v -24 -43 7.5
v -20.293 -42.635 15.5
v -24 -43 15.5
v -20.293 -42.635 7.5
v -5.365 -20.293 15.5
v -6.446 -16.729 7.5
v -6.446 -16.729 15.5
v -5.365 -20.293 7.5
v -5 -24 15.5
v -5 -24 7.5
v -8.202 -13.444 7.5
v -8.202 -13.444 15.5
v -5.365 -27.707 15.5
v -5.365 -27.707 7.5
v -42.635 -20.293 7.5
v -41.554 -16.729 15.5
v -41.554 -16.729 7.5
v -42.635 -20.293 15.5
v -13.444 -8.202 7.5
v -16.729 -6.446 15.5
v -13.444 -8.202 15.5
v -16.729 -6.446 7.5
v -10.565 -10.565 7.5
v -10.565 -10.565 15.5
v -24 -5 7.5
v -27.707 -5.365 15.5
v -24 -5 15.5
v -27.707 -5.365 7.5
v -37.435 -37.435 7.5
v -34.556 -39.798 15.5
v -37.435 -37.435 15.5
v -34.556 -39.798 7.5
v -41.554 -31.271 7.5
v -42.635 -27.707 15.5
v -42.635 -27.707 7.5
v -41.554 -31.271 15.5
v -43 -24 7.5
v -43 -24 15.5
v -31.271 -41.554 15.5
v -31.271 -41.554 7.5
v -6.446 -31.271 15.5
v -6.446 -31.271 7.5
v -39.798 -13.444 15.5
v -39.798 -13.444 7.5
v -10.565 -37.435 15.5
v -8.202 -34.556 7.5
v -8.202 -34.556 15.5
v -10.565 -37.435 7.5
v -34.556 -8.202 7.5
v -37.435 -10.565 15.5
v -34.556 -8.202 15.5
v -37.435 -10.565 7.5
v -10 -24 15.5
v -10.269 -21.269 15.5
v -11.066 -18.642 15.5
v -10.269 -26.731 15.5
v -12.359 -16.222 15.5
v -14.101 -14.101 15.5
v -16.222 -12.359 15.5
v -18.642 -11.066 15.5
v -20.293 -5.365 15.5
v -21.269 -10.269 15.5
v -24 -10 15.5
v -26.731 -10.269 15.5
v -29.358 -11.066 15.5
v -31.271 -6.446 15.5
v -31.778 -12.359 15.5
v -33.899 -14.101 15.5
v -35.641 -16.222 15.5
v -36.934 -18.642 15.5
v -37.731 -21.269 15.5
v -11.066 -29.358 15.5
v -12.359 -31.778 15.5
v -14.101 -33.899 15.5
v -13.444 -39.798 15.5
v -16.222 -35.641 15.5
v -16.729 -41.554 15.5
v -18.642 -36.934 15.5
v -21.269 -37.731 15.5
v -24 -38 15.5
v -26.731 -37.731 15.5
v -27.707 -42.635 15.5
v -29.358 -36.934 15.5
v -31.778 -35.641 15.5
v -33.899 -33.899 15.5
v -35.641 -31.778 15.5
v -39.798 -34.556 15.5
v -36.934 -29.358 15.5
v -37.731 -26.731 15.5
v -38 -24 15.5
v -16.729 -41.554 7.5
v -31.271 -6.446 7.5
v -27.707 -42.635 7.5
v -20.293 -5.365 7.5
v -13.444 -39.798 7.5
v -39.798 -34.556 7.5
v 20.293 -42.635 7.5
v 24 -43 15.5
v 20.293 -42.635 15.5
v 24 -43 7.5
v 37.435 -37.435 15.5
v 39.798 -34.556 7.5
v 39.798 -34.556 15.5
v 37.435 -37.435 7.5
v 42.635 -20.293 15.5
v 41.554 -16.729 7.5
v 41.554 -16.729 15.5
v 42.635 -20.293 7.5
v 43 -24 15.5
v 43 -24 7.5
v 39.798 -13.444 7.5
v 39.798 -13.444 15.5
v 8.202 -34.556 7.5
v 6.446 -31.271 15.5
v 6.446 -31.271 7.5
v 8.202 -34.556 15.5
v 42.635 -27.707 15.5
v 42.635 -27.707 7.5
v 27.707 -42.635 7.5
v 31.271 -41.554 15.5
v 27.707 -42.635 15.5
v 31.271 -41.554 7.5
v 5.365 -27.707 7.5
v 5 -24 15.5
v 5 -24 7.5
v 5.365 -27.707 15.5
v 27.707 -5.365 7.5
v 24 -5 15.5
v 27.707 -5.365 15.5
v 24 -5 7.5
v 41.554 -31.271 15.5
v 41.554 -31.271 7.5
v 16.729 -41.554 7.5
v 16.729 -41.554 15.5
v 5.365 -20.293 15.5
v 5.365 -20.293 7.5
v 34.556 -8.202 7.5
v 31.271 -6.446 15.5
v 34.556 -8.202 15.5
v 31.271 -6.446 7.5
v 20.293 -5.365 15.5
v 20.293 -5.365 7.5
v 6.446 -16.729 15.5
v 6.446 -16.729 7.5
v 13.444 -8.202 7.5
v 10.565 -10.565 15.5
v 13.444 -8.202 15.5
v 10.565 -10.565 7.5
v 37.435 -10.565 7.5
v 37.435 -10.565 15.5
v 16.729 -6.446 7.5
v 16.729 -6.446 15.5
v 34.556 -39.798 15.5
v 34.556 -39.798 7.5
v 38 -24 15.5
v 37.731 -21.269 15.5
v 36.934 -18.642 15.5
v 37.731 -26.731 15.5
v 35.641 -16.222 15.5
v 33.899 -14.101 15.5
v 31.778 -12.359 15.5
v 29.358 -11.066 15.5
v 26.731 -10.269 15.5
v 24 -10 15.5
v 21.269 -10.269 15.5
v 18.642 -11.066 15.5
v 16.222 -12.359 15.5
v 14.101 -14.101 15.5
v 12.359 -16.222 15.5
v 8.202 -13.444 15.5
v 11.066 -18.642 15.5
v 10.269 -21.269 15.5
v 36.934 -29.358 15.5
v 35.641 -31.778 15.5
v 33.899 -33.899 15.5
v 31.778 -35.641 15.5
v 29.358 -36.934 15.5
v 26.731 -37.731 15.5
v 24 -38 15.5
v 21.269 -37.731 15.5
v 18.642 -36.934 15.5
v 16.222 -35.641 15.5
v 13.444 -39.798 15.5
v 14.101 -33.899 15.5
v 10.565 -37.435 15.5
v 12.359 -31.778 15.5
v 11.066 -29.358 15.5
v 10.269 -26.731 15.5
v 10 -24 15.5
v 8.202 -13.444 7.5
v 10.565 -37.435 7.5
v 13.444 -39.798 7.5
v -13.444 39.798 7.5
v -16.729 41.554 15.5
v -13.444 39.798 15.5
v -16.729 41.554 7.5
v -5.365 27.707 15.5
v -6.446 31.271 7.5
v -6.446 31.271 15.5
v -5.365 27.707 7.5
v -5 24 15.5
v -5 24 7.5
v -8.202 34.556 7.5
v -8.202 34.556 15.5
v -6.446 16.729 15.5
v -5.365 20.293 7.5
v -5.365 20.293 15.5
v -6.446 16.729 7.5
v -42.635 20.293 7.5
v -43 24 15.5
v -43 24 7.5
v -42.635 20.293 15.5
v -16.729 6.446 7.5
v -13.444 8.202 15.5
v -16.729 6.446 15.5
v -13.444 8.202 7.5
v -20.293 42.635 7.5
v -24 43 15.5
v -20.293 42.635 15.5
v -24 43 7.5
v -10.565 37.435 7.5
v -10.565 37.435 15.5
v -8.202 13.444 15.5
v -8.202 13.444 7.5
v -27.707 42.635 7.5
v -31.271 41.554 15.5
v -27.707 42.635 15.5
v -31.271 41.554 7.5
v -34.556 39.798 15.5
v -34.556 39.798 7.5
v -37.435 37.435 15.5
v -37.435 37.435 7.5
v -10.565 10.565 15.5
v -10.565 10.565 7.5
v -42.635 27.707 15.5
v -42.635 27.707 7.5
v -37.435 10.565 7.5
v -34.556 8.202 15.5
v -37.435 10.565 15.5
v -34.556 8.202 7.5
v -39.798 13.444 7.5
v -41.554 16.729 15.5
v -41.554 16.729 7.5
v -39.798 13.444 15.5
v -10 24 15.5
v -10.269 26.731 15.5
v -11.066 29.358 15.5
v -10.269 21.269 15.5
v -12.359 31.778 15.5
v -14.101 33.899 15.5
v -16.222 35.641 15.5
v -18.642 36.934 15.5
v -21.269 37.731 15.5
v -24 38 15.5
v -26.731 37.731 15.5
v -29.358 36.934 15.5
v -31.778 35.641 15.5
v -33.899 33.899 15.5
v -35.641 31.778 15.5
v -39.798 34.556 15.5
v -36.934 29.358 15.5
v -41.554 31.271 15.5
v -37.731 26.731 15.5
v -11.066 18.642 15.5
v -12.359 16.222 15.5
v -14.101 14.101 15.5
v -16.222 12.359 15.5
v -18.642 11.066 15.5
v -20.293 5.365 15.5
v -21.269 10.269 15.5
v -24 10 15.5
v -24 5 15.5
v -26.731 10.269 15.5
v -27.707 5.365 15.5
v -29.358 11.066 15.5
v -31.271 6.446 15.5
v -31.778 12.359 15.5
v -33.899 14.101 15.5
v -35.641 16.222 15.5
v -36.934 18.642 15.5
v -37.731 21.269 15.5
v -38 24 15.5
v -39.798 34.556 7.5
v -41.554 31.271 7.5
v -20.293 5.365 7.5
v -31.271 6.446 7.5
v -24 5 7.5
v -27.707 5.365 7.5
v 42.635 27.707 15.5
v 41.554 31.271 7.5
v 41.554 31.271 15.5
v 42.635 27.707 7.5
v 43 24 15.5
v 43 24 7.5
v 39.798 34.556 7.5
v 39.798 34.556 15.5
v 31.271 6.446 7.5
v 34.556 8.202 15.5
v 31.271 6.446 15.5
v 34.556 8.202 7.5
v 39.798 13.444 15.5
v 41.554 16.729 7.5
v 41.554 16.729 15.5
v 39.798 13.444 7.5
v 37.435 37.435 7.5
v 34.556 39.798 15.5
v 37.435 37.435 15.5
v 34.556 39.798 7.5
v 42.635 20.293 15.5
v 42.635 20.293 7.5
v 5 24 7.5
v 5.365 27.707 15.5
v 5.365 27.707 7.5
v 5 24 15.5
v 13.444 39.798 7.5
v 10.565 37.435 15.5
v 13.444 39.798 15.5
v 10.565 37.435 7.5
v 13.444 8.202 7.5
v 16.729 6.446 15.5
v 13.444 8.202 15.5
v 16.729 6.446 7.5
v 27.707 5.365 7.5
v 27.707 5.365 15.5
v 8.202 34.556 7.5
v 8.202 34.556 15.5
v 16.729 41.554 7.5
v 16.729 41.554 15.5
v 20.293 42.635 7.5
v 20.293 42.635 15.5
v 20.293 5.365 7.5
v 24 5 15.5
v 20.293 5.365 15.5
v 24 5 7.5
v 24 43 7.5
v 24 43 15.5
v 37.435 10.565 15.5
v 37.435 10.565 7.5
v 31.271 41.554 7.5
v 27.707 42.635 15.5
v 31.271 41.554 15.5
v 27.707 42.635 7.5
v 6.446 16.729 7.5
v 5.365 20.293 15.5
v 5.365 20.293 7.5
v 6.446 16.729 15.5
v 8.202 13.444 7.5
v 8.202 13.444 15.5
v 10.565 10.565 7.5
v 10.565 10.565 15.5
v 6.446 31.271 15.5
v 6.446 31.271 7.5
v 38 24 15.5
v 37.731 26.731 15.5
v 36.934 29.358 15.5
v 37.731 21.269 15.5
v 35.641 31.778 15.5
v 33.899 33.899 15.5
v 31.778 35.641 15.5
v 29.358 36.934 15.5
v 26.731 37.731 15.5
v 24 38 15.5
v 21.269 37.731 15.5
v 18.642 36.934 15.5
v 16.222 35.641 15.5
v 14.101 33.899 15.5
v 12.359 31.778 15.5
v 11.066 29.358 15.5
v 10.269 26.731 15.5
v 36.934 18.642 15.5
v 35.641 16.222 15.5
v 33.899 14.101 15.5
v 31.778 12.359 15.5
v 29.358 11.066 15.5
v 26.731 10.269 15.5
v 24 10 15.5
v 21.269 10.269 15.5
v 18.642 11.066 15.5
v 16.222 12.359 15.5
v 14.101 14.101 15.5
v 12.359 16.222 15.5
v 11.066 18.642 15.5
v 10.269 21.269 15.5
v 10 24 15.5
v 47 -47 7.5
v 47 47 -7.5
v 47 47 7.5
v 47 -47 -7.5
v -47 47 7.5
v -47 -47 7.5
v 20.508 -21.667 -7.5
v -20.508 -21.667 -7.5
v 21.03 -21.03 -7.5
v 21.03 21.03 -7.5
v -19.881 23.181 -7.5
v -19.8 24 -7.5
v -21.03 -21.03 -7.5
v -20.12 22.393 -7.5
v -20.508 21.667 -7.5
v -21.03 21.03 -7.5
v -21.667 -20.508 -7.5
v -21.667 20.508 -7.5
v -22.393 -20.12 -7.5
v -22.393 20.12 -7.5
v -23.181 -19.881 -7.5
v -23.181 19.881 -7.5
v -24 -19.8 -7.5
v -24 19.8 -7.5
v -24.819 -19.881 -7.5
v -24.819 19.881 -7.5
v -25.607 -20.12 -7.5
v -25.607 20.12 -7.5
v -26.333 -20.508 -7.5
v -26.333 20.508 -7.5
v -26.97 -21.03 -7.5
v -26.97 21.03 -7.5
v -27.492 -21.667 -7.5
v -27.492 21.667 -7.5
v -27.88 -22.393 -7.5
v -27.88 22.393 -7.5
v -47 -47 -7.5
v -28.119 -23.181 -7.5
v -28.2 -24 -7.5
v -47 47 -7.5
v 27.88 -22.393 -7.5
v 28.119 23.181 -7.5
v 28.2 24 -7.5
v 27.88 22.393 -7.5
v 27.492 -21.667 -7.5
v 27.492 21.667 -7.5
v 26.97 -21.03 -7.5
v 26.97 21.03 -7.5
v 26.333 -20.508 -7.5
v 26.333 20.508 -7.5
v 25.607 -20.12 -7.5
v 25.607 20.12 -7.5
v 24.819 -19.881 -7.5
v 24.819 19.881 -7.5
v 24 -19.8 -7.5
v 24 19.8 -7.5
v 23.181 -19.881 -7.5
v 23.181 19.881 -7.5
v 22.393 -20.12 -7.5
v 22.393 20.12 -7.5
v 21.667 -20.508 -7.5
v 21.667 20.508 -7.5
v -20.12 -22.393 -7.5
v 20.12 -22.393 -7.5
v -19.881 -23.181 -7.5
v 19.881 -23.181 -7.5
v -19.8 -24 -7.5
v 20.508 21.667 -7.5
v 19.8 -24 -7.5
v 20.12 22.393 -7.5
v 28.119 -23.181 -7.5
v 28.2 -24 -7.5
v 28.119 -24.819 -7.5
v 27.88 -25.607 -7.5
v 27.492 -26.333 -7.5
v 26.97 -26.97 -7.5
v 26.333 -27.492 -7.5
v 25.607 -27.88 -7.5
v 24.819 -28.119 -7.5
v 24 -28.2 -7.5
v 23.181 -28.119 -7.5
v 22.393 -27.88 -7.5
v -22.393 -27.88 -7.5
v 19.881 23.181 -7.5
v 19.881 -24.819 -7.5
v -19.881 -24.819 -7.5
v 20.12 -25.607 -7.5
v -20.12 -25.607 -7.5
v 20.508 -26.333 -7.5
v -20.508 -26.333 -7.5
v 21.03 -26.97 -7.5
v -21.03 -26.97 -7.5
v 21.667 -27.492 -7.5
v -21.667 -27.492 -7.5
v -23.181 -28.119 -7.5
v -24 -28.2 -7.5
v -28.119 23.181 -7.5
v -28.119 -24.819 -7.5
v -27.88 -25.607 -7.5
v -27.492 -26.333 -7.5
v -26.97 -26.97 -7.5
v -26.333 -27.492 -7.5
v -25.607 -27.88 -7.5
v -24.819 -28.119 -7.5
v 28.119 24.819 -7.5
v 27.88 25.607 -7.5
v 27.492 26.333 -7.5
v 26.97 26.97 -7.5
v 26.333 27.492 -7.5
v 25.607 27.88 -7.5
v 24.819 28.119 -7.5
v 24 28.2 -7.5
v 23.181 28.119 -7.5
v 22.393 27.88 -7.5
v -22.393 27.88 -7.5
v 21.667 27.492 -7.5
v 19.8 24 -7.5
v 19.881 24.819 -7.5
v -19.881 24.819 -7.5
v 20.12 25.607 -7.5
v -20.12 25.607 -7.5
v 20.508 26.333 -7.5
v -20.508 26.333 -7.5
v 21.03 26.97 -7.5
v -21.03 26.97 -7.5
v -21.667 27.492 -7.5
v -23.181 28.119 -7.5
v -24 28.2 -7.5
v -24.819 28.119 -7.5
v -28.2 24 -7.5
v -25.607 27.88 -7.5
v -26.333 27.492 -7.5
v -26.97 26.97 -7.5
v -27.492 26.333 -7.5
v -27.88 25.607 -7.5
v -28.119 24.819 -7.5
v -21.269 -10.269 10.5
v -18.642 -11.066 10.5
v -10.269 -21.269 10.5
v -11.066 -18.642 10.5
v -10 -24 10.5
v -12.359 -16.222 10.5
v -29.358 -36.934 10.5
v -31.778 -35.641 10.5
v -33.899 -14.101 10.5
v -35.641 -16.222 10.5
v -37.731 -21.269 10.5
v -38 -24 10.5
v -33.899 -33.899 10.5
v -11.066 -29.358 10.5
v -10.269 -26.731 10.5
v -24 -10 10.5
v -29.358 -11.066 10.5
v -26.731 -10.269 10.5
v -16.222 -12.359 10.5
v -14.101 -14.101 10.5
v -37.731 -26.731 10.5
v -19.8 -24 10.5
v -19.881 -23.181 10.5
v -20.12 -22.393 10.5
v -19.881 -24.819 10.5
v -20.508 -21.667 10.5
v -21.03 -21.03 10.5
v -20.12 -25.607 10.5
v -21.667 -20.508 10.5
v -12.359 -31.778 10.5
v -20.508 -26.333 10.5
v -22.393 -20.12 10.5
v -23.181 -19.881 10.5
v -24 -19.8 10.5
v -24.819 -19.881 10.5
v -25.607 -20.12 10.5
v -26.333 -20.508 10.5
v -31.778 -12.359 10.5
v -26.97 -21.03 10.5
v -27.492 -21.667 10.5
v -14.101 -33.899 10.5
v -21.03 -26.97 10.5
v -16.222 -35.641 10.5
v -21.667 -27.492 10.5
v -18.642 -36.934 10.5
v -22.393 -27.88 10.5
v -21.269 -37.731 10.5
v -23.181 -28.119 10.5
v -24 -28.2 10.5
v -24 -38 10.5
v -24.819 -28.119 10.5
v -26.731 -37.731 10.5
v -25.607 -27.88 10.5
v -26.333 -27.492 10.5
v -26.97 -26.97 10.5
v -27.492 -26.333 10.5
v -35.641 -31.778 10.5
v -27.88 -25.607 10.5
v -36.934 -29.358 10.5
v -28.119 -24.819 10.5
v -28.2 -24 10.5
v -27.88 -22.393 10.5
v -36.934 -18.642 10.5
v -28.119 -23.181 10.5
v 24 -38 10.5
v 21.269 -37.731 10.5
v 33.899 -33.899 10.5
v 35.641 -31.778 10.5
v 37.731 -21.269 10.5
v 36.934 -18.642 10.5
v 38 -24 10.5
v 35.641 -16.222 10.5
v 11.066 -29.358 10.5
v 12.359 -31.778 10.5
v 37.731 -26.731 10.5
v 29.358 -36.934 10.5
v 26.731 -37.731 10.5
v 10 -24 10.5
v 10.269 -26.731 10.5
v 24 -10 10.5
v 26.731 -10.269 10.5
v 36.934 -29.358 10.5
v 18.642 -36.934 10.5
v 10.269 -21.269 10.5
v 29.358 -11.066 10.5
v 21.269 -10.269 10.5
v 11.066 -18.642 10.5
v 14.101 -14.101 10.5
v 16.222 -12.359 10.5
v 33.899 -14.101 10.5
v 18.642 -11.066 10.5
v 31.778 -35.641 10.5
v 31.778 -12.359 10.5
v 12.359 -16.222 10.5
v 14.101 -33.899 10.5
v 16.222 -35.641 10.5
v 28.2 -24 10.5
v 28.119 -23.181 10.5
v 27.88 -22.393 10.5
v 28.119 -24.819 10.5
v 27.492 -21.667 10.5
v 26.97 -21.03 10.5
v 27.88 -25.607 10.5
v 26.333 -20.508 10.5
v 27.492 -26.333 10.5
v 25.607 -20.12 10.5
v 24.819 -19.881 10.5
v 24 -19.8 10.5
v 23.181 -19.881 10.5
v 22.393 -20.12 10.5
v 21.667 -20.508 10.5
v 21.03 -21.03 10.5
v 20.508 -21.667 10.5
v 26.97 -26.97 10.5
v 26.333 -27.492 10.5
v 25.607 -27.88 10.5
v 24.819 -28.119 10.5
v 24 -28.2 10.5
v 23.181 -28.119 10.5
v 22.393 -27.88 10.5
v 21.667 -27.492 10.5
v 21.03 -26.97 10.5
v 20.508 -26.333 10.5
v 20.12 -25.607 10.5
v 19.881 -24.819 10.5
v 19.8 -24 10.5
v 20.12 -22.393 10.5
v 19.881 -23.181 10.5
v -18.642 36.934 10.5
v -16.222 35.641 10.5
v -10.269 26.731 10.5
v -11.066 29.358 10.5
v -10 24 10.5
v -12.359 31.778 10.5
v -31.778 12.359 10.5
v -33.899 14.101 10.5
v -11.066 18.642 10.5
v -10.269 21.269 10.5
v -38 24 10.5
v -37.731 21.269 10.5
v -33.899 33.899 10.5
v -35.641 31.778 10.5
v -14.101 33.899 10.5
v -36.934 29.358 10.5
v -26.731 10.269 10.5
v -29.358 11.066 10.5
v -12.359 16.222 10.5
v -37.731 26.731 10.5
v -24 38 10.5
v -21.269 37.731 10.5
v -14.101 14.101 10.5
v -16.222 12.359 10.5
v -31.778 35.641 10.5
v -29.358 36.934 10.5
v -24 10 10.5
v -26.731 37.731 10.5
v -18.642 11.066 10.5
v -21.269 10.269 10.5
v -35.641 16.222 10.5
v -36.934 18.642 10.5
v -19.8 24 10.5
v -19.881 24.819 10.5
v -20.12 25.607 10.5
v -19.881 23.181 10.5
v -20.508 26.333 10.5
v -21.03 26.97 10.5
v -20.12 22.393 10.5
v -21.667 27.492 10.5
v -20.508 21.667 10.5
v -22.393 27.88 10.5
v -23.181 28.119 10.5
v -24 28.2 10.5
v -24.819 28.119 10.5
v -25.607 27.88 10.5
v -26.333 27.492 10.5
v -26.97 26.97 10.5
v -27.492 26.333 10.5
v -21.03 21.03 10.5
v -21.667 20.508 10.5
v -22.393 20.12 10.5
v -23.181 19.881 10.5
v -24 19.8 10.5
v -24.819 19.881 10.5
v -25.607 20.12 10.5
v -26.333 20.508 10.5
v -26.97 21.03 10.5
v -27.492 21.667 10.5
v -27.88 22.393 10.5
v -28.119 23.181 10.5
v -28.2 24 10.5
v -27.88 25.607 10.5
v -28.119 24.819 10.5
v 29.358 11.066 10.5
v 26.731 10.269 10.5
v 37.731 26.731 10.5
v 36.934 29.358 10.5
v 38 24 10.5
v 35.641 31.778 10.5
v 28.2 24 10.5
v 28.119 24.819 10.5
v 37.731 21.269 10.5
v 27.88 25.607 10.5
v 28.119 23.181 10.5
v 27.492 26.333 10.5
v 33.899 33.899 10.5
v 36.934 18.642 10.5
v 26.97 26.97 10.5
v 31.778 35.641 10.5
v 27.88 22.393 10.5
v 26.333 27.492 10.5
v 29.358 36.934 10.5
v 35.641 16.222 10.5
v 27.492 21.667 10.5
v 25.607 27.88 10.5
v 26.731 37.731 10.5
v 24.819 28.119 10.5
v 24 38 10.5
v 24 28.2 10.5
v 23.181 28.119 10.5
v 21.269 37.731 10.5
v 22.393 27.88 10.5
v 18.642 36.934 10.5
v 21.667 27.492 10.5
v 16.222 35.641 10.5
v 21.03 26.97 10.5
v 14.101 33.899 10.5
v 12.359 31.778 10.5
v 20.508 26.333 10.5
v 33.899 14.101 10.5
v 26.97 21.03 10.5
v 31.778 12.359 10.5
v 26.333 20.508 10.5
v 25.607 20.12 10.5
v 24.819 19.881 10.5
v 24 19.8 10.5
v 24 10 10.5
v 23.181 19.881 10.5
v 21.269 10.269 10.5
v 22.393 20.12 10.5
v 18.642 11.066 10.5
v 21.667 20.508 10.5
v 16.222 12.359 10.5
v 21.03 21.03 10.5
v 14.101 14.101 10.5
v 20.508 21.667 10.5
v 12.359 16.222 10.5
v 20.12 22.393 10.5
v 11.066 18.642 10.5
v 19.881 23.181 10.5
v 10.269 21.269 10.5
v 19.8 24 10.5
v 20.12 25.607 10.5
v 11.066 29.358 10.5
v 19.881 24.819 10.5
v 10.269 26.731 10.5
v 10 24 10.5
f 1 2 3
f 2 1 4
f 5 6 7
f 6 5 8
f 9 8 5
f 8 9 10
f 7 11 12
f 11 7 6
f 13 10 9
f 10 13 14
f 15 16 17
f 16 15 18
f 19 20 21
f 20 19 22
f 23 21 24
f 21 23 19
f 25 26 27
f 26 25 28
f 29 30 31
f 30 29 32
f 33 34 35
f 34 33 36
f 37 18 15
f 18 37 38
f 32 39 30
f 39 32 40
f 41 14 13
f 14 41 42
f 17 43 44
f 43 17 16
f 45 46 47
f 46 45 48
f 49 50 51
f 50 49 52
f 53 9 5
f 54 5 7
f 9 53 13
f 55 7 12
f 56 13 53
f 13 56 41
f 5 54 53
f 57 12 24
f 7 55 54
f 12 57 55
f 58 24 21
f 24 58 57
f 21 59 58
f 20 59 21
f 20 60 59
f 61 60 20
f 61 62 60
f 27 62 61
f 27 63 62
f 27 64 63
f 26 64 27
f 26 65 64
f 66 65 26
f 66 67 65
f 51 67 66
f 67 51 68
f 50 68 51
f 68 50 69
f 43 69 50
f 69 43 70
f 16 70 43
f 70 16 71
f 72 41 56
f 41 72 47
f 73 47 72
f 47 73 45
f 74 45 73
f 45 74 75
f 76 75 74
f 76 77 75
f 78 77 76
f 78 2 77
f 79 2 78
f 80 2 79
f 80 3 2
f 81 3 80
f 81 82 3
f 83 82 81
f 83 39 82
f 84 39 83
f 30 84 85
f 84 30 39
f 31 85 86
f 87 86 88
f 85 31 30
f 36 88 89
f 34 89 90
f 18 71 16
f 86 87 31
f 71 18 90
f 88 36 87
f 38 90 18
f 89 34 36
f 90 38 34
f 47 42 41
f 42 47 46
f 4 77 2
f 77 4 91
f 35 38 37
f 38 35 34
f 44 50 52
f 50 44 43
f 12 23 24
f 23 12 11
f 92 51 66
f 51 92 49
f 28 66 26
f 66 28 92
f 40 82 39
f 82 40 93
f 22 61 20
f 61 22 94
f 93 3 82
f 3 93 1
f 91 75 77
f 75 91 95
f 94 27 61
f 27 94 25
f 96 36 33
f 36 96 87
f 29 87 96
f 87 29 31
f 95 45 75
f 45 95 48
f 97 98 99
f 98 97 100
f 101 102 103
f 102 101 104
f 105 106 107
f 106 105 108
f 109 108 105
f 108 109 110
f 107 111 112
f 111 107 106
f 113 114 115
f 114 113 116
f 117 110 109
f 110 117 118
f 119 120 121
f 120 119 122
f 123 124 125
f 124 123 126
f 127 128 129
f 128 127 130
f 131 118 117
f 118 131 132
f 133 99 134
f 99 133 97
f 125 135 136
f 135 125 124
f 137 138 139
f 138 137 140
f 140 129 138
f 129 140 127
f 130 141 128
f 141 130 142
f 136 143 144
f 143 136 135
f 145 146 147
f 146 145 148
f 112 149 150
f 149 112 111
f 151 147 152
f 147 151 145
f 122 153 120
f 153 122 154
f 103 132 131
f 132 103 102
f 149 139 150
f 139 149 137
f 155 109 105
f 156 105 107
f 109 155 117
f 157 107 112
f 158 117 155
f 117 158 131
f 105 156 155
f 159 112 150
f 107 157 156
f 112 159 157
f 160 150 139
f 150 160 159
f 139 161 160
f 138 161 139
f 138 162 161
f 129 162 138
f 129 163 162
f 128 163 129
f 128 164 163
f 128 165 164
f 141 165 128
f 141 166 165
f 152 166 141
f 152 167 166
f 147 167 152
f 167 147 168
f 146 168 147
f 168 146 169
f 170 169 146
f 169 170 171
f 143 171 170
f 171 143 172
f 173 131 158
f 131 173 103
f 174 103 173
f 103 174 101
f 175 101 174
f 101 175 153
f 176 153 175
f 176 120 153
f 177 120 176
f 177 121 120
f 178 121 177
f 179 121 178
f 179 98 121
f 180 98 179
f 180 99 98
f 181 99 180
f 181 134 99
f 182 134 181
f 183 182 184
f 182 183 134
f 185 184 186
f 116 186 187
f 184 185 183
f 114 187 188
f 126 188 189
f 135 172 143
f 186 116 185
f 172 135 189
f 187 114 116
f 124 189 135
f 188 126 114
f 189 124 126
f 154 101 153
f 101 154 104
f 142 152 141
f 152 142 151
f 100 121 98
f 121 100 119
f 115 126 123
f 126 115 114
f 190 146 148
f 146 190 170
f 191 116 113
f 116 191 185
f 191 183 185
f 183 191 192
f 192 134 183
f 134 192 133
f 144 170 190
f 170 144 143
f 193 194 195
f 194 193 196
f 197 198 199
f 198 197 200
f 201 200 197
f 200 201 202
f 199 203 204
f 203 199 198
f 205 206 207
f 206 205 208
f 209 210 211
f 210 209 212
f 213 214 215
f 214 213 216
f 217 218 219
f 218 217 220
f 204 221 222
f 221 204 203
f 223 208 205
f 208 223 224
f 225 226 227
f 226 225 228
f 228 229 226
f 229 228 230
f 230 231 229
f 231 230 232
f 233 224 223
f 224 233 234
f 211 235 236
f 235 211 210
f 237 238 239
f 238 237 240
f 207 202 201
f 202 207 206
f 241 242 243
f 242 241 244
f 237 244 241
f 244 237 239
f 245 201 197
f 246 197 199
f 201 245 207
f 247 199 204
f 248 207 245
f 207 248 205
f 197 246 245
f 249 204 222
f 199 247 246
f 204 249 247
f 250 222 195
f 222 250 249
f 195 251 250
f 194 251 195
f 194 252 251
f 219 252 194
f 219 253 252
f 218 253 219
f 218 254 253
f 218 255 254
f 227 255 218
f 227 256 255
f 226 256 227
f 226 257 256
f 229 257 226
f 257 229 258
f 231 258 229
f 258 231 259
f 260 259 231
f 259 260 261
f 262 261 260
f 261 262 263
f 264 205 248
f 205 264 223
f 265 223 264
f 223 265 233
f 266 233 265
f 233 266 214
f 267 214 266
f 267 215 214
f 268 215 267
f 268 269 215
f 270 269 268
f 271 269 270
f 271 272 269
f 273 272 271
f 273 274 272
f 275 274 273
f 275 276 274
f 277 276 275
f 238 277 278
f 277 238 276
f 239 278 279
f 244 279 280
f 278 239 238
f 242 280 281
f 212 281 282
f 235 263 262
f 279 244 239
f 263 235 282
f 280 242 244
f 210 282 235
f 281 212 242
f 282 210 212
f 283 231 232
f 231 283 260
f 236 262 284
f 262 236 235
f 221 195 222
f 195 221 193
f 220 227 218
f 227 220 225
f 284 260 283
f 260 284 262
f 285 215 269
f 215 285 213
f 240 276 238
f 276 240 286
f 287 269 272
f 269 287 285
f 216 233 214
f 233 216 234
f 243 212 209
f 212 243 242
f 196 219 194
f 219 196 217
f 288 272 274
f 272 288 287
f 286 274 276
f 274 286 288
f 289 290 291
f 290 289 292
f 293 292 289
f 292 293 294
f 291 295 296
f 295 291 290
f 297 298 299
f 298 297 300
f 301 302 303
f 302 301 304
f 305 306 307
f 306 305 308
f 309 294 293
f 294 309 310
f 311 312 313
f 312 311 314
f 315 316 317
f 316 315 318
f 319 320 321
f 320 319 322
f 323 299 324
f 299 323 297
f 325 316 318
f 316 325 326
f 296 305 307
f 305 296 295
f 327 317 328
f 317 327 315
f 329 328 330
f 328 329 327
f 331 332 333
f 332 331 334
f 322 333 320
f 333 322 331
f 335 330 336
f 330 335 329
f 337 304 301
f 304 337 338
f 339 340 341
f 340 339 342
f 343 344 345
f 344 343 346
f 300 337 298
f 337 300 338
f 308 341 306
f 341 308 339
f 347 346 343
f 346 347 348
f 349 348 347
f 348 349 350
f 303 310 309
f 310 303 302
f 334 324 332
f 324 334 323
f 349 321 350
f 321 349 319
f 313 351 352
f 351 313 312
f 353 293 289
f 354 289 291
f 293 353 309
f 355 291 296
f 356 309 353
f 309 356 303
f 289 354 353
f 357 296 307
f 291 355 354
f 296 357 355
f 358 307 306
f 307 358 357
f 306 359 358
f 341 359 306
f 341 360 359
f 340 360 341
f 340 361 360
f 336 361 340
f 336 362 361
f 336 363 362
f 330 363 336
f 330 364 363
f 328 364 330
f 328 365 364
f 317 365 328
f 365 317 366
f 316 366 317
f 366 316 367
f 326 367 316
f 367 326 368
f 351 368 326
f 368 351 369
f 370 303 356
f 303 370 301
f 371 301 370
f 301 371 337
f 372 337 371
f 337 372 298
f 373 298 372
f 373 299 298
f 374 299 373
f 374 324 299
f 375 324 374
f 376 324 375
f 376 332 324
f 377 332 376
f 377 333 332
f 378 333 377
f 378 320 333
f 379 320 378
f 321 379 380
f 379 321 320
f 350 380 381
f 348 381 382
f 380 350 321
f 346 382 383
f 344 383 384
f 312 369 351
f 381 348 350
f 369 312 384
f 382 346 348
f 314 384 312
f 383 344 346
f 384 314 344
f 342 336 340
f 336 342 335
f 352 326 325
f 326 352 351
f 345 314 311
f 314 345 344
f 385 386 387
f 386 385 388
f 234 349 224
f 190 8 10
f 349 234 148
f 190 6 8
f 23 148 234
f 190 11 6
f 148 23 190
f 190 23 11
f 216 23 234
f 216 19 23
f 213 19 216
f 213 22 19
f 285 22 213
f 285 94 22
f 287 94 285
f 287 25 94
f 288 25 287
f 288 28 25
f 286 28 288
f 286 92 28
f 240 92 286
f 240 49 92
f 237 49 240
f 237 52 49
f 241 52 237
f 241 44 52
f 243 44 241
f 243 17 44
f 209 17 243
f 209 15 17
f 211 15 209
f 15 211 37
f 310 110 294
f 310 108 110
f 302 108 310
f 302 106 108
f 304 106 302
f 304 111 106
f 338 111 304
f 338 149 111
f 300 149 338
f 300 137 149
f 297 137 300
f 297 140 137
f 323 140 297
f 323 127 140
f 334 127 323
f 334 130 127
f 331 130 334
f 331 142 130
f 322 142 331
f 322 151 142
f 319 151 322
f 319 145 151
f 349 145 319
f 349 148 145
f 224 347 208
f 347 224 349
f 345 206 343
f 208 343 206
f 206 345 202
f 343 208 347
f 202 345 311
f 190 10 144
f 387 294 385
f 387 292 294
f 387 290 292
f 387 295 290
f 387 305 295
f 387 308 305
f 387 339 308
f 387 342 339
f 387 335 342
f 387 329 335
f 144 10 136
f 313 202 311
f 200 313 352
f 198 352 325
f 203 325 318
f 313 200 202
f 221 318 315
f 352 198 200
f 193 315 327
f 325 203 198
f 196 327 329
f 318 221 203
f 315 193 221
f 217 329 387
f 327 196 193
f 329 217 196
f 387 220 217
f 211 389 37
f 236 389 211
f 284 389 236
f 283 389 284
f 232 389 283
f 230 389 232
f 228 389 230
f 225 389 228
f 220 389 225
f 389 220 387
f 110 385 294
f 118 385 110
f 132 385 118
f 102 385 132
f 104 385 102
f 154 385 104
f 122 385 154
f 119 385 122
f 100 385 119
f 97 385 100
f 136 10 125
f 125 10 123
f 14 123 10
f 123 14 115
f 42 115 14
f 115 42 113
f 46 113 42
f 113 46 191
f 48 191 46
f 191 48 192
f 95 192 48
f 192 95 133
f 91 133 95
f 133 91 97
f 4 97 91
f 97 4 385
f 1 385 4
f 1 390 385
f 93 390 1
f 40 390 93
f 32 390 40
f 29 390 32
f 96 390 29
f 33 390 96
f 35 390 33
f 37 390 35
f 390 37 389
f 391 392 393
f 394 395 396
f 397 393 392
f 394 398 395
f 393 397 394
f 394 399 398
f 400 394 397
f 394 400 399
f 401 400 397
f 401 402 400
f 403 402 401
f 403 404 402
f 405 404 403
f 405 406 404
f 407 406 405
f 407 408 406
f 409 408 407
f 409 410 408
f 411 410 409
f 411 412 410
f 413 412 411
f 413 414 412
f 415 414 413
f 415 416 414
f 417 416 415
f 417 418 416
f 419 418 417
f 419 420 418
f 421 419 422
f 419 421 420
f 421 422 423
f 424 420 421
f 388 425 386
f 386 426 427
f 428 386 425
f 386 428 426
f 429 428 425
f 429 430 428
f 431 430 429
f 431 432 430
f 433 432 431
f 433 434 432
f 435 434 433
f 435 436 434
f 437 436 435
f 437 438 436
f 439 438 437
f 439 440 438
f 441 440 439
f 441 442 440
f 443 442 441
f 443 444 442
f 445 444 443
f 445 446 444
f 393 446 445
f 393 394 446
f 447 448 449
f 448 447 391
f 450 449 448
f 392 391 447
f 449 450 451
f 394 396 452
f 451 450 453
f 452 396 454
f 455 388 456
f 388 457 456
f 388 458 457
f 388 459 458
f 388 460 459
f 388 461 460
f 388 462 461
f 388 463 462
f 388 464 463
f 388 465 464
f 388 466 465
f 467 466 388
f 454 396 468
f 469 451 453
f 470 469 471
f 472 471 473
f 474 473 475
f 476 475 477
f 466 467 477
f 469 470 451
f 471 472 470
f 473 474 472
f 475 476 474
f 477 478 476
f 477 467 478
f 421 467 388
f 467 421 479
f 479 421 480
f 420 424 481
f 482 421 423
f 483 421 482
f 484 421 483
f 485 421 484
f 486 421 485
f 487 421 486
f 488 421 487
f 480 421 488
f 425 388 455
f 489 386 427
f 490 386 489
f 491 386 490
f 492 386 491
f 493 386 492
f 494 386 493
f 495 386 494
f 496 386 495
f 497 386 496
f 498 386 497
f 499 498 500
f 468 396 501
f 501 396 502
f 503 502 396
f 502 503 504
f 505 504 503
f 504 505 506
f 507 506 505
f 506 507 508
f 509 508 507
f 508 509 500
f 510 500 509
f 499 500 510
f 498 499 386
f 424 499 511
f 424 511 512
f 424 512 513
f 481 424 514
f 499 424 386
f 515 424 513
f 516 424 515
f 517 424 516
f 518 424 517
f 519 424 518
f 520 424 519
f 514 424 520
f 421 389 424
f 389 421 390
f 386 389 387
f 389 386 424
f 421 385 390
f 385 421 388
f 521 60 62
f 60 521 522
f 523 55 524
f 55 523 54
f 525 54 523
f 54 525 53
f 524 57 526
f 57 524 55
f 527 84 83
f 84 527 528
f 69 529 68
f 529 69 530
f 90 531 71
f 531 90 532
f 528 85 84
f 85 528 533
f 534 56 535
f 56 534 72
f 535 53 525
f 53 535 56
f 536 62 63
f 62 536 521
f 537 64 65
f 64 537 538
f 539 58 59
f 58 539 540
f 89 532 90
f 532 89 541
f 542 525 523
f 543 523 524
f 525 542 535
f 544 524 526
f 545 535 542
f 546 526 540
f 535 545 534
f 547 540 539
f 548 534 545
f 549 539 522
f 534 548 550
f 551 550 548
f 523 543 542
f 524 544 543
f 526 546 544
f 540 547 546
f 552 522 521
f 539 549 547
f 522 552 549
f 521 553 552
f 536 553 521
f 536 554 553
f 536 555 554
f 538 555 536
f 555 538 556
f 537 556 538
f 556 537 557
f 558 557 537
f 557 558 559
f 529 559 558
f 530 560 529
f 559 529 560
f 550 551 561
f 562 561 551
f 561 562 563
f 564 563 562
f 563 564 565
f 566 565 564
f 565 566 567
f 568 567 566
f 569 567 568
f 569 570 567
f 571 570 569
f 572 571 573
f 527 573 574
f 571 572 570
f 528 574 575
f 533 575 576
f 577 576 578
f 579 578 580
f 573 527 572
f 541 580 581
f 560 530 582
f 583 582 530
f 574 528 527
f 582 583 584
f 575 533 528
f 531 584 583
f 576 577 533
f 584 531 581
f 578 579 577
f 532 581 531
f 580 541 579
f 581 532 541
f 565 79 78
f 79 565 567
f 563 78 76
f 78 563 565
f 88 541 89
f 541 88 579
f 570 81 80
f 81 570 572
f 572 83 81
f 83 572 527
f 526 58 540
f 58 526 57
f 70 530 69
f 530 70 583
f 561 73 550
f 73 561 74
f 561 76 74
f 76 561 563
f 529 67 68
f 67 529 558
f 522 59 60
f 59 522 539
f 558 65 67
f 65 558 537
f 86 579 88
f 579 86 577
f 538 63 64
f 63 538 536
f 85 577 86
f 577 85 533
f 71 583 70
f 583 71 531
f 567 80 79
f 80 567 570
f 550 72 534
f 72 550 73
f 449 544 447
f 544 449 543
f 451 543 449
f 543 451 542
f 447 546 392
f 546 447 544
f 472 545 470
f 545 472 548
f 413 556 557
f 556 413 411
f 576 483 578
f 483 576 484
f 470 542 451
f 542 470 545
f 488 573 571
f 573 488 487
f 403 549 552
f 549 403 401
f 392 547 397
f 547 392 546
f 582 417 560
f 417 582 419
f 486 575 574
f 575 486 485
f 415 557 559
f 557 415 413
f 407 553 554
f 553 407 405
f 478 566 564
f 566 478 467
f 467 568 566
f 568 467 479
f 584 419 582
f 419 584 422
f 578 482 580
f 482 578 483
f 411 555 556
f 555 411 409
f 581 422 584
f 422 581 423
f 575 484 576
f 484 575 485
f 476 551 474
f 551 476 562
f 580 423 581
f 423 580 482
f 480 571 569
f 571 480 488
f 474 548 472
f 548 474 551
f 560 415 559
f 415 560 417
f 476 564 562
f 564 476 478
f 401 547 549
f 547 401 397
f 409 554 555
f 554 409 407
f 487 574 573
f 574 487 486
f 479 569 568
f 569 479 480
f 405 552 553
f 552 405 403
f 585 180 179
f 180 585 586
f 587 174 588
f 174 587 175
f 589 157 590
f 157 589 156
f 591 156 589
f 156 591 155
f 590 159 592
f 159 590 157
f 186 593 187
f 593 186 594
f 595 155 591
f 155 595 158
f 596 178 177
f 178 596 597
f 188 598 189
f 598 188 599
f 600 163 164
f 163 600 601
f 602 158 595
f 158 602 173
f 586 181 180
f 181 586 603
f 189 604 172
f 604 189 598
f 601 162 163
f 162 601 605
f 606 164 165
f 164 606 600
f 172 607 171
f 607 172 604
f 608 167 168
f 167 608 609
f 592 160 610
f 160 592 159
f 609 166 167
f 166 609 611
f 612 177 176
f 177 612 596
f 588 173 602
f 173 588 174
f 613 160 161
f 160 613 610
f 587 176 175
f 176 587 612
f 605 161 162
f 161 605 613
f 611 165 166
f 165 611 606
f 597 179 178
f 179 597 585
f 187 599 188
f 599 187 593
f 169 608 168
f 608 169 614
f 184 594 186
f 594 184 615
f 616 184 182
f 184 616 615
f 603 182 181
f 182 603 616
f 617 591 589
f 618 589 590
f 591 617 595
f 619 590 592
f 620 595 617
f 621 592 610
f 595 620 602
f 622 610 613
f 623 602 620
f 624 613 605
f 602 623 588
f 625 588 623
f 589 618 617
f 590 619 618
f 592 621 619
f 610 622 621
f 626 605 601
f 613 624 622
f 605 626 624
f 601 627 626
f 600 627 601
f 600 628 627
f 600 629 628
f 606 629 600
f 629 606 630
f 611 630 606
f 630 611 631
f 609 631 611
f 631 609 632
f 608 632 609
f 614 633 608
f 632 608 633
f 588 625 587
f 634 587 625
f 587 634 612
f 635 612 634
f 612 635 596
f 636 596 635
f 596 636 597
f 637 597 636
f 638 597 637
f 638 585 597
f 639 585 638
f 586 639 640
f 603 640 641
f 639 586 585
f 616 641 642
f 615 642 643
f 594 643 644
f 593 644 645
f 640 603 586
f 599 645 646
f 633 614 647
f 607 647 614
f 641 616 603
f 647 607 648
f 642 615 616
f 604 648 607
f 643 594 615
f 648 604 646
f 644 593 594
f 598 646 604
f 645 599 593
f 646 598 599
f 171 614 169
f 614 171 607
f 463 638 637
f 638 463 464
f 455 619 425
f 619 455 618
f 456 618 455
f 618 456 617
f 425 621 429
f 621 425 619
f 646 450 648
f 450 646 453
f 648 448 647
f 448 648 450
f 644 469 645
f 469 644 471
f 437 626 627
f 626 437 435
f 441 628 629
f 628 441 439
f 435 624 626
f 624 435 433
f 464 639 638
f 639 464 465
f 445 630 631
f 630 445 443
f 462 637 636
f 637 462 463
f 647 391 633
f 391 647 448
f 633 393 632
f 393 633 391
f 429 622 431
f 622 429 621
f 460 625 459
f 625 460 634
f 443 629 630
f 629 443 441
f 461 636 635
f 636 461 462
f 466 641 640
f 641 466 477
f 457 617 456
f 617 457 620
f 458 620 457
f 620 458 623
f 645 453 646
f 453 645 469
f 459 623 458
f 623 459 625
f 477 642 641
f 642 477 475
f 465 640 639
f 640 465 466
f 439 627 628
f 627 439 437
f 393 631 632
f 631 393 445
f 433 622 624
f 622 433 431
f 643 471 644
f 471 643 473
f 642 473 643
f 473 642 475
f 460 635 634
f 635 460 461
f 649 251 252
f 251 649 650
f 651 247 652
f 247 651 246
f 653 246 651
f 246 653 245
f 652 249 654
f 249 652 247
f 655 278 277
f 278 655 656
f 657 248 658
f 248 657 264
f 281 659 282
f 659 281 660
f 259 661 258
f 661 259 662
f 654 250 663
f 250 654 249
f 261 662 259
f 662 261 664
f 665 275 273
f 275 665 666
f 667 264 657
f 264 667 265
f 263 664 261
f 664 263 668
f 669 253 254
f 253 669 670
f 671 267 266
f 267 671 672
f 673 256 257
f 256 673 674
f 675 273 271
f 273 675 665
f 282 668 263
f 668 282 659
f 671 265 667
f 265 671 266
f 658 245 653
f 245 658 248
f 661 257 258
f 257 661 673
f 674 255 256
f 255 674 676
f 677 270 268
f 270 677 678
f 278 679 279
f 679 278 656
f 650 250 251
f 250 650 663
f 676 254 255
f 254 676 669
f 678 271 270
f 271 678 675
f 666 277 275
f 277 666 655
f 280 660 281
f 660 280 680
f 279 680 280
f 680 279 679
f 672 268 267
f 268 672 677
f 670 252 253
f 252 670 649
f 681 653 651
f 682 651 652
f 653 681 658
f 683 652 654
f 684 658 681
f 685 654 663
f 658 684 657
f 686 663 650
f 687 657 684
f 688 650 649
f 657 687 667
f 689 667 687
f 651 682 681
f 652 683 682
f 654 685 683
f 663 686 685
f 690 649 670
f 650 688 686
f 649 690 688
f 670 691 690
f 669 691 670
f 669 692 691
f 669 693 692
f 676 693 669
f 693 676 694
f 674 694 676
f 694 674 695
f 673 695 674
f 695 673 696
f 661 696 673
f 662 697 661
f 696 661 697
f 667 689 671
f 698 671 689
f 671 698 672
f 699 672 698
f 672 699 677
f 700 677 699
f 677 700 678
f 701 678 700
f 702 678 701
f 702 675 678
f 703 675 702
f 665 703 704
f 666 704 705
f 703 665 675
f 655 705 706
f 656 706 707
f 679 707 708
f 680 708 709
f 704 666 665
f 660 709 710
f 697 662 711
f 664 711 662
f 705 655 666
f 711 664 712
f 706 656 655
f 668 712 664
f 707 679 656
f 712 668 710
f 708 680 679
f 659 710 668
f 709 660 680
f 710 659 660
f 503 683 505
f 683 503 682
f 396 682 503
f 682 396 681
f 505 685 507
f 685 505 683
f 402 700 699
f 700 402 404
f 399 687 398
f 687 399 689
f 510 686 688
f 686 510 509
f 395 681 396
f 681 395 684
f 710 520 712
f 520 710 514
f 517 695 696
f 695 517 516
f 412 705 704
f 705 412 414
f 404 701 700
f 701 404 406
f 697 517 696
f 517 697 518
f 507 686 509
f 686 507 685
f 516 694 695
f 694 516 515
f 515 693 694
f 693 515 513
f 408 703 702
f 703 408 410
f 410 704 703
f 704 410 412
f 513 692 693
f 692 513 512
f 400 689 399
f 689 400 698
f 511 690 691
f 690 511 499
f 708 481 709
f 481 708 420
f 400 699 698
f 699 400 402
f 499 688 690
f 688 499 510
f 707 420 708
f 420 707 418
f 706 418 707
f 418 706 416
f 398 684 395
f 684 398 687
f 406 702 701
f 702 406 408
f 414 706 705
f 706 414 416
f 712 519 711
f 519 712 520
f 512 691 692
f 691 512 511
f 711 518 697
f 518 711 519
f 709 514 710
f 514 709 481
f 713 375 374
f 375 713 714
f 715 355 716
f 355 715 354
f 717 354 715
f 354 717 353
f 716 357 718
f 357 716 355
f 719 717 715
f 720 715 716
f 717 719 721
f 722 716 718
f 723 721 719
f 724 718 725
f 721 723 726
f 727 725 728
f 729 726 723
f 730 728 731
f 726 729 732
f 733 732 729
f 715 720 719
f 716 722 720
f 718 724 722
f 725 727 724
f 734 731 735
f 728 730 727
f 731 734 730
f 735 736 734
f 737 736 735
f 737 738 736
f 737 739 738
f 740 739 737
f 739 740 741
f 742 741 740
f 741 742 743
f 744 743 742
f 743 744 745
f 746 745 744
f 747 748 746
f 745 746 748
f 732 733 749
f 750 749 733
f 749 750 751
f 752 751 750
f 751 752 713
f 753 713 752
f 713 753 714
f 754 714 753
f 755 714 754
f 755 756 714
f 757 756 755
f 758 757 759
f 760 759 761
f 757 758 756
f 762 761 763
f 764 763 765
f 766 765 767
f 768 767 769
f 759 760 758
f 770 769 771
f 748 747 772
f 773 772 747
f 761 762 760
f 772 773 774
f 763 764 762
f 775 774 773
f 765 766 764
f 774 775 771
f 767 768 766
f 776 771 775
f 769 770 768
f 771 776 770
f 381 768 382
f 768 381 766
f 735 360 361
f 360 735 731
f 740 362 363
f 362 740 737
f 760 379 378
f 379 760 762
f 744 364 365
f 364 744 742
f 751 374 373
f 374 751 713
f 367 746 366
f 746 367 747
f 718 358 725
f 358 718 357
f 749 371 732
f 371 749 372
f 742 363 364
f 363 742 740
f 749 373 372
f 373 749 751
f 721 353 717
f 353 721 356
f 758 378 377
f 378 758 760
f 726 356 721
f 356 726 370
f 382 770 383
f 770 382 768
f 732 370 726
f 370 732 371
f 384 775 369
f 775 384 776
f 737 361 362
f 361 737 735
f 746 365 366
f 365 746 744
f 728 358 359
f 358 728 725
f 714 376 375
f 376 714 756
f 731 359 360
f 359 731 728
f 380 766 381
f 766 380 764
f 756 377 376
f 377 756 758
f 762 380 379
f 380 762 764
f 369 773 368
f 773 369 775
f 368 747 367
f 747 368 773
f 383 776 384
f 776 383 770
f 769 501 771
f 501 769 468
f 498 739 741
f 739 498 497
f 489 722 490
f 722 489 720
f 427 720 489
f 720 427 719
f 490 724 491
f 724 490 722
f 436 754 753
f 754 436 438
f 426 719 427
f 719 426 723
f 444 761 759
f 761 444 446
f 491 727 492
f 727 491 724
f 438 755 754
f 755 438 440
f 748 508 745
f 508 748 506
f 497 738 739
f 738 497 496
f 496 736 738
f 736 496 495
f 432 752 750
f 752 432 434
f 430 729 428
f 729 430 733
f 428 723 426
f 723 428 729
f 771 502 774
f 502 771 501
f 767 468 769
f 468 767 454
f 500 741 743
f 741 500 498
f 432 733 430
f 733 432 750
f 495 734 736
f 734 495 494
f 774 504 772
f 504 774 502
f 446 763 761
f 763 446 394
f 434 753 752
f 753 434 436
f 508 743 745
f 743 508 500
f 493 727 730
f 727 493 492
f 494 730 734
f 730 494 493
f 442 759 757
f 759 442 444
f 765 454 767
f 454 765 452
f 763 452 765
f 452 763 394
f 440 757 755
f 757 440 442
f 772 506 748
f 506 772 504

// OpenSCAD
$fn = 32;

// ----------------------------------------------------------------------
// Socket pad plate
// bosses with counterbored sockets for the screws
// ----------------------------------------------------------------------

// --- parameters (mm) ---
base_t = 15;       // base plate thickness
boss_h = 8;        // boss height above the base plate
boss_d = 38;       // boss diameter
socket_d = 28;     // socket diameter
socket_depth = 5;  // socket depth from the boss face
bolt_d = 8.4;      // screw clearance hole through the socket floor
rows = 2;          // boss rows
cols = 2;          // bosses per row
pitch = 48;        // boss pitch

// --- derived feature positions (mm) ---
height = base_t + boss_h;           // = 23   overall height of the part
plate = [pitch * (cols - 1) + boss_d + 8, pitch * (rows - 1) + boss_d + 8, base_t];  // = [94, 94, 15]   overall size (x, y, z)
span_x = pitch * (cols - 1);        // = 48   distance between outer bosses
span_y = pitch * (rows - 1);        // = 48   distance between boss rows
origin_x = -span_x / 2;             // = -24   X of the first boss
origin_y = -span_y / 2;             // = -24   Y of the first boss
feature_centers = [
  [origin_x + 0 * pitch, origin_y + 0 * pitch],
  [origin_x + 1 * pitch, origin_y + 0 * pitch],
  [origin_x + 0 * pitch, origin_y + 1 * pitch],
  [origin_x + 1 * pitch, origin_y + 1 * pitch]
];   // boss centres: sockets, holes and the pads themselves are placed from here

// base plate, bosses on feature_centers, socket + through hole in each
difference() {
  union() {
    cube(plate, center = true);
    for (centre = feature_centers)
      translate([centre[0], centre[1], plate[2] / 2 - 1])
        cylinder(d = boss_d, h = boss_h + 1);
  }
  for (centre = feature_centers) {
    translate([centre[0], centre[1], plate[2] / 2 + boss_h - socket_depth])
      cylinder(d = socket_d, h = socket_depth + 1);
    translate([centre[0], centre[1], -height])
      cylinder(d = bolt_d, h = 2 * height + 2);  // through the socket floor
  }
}
